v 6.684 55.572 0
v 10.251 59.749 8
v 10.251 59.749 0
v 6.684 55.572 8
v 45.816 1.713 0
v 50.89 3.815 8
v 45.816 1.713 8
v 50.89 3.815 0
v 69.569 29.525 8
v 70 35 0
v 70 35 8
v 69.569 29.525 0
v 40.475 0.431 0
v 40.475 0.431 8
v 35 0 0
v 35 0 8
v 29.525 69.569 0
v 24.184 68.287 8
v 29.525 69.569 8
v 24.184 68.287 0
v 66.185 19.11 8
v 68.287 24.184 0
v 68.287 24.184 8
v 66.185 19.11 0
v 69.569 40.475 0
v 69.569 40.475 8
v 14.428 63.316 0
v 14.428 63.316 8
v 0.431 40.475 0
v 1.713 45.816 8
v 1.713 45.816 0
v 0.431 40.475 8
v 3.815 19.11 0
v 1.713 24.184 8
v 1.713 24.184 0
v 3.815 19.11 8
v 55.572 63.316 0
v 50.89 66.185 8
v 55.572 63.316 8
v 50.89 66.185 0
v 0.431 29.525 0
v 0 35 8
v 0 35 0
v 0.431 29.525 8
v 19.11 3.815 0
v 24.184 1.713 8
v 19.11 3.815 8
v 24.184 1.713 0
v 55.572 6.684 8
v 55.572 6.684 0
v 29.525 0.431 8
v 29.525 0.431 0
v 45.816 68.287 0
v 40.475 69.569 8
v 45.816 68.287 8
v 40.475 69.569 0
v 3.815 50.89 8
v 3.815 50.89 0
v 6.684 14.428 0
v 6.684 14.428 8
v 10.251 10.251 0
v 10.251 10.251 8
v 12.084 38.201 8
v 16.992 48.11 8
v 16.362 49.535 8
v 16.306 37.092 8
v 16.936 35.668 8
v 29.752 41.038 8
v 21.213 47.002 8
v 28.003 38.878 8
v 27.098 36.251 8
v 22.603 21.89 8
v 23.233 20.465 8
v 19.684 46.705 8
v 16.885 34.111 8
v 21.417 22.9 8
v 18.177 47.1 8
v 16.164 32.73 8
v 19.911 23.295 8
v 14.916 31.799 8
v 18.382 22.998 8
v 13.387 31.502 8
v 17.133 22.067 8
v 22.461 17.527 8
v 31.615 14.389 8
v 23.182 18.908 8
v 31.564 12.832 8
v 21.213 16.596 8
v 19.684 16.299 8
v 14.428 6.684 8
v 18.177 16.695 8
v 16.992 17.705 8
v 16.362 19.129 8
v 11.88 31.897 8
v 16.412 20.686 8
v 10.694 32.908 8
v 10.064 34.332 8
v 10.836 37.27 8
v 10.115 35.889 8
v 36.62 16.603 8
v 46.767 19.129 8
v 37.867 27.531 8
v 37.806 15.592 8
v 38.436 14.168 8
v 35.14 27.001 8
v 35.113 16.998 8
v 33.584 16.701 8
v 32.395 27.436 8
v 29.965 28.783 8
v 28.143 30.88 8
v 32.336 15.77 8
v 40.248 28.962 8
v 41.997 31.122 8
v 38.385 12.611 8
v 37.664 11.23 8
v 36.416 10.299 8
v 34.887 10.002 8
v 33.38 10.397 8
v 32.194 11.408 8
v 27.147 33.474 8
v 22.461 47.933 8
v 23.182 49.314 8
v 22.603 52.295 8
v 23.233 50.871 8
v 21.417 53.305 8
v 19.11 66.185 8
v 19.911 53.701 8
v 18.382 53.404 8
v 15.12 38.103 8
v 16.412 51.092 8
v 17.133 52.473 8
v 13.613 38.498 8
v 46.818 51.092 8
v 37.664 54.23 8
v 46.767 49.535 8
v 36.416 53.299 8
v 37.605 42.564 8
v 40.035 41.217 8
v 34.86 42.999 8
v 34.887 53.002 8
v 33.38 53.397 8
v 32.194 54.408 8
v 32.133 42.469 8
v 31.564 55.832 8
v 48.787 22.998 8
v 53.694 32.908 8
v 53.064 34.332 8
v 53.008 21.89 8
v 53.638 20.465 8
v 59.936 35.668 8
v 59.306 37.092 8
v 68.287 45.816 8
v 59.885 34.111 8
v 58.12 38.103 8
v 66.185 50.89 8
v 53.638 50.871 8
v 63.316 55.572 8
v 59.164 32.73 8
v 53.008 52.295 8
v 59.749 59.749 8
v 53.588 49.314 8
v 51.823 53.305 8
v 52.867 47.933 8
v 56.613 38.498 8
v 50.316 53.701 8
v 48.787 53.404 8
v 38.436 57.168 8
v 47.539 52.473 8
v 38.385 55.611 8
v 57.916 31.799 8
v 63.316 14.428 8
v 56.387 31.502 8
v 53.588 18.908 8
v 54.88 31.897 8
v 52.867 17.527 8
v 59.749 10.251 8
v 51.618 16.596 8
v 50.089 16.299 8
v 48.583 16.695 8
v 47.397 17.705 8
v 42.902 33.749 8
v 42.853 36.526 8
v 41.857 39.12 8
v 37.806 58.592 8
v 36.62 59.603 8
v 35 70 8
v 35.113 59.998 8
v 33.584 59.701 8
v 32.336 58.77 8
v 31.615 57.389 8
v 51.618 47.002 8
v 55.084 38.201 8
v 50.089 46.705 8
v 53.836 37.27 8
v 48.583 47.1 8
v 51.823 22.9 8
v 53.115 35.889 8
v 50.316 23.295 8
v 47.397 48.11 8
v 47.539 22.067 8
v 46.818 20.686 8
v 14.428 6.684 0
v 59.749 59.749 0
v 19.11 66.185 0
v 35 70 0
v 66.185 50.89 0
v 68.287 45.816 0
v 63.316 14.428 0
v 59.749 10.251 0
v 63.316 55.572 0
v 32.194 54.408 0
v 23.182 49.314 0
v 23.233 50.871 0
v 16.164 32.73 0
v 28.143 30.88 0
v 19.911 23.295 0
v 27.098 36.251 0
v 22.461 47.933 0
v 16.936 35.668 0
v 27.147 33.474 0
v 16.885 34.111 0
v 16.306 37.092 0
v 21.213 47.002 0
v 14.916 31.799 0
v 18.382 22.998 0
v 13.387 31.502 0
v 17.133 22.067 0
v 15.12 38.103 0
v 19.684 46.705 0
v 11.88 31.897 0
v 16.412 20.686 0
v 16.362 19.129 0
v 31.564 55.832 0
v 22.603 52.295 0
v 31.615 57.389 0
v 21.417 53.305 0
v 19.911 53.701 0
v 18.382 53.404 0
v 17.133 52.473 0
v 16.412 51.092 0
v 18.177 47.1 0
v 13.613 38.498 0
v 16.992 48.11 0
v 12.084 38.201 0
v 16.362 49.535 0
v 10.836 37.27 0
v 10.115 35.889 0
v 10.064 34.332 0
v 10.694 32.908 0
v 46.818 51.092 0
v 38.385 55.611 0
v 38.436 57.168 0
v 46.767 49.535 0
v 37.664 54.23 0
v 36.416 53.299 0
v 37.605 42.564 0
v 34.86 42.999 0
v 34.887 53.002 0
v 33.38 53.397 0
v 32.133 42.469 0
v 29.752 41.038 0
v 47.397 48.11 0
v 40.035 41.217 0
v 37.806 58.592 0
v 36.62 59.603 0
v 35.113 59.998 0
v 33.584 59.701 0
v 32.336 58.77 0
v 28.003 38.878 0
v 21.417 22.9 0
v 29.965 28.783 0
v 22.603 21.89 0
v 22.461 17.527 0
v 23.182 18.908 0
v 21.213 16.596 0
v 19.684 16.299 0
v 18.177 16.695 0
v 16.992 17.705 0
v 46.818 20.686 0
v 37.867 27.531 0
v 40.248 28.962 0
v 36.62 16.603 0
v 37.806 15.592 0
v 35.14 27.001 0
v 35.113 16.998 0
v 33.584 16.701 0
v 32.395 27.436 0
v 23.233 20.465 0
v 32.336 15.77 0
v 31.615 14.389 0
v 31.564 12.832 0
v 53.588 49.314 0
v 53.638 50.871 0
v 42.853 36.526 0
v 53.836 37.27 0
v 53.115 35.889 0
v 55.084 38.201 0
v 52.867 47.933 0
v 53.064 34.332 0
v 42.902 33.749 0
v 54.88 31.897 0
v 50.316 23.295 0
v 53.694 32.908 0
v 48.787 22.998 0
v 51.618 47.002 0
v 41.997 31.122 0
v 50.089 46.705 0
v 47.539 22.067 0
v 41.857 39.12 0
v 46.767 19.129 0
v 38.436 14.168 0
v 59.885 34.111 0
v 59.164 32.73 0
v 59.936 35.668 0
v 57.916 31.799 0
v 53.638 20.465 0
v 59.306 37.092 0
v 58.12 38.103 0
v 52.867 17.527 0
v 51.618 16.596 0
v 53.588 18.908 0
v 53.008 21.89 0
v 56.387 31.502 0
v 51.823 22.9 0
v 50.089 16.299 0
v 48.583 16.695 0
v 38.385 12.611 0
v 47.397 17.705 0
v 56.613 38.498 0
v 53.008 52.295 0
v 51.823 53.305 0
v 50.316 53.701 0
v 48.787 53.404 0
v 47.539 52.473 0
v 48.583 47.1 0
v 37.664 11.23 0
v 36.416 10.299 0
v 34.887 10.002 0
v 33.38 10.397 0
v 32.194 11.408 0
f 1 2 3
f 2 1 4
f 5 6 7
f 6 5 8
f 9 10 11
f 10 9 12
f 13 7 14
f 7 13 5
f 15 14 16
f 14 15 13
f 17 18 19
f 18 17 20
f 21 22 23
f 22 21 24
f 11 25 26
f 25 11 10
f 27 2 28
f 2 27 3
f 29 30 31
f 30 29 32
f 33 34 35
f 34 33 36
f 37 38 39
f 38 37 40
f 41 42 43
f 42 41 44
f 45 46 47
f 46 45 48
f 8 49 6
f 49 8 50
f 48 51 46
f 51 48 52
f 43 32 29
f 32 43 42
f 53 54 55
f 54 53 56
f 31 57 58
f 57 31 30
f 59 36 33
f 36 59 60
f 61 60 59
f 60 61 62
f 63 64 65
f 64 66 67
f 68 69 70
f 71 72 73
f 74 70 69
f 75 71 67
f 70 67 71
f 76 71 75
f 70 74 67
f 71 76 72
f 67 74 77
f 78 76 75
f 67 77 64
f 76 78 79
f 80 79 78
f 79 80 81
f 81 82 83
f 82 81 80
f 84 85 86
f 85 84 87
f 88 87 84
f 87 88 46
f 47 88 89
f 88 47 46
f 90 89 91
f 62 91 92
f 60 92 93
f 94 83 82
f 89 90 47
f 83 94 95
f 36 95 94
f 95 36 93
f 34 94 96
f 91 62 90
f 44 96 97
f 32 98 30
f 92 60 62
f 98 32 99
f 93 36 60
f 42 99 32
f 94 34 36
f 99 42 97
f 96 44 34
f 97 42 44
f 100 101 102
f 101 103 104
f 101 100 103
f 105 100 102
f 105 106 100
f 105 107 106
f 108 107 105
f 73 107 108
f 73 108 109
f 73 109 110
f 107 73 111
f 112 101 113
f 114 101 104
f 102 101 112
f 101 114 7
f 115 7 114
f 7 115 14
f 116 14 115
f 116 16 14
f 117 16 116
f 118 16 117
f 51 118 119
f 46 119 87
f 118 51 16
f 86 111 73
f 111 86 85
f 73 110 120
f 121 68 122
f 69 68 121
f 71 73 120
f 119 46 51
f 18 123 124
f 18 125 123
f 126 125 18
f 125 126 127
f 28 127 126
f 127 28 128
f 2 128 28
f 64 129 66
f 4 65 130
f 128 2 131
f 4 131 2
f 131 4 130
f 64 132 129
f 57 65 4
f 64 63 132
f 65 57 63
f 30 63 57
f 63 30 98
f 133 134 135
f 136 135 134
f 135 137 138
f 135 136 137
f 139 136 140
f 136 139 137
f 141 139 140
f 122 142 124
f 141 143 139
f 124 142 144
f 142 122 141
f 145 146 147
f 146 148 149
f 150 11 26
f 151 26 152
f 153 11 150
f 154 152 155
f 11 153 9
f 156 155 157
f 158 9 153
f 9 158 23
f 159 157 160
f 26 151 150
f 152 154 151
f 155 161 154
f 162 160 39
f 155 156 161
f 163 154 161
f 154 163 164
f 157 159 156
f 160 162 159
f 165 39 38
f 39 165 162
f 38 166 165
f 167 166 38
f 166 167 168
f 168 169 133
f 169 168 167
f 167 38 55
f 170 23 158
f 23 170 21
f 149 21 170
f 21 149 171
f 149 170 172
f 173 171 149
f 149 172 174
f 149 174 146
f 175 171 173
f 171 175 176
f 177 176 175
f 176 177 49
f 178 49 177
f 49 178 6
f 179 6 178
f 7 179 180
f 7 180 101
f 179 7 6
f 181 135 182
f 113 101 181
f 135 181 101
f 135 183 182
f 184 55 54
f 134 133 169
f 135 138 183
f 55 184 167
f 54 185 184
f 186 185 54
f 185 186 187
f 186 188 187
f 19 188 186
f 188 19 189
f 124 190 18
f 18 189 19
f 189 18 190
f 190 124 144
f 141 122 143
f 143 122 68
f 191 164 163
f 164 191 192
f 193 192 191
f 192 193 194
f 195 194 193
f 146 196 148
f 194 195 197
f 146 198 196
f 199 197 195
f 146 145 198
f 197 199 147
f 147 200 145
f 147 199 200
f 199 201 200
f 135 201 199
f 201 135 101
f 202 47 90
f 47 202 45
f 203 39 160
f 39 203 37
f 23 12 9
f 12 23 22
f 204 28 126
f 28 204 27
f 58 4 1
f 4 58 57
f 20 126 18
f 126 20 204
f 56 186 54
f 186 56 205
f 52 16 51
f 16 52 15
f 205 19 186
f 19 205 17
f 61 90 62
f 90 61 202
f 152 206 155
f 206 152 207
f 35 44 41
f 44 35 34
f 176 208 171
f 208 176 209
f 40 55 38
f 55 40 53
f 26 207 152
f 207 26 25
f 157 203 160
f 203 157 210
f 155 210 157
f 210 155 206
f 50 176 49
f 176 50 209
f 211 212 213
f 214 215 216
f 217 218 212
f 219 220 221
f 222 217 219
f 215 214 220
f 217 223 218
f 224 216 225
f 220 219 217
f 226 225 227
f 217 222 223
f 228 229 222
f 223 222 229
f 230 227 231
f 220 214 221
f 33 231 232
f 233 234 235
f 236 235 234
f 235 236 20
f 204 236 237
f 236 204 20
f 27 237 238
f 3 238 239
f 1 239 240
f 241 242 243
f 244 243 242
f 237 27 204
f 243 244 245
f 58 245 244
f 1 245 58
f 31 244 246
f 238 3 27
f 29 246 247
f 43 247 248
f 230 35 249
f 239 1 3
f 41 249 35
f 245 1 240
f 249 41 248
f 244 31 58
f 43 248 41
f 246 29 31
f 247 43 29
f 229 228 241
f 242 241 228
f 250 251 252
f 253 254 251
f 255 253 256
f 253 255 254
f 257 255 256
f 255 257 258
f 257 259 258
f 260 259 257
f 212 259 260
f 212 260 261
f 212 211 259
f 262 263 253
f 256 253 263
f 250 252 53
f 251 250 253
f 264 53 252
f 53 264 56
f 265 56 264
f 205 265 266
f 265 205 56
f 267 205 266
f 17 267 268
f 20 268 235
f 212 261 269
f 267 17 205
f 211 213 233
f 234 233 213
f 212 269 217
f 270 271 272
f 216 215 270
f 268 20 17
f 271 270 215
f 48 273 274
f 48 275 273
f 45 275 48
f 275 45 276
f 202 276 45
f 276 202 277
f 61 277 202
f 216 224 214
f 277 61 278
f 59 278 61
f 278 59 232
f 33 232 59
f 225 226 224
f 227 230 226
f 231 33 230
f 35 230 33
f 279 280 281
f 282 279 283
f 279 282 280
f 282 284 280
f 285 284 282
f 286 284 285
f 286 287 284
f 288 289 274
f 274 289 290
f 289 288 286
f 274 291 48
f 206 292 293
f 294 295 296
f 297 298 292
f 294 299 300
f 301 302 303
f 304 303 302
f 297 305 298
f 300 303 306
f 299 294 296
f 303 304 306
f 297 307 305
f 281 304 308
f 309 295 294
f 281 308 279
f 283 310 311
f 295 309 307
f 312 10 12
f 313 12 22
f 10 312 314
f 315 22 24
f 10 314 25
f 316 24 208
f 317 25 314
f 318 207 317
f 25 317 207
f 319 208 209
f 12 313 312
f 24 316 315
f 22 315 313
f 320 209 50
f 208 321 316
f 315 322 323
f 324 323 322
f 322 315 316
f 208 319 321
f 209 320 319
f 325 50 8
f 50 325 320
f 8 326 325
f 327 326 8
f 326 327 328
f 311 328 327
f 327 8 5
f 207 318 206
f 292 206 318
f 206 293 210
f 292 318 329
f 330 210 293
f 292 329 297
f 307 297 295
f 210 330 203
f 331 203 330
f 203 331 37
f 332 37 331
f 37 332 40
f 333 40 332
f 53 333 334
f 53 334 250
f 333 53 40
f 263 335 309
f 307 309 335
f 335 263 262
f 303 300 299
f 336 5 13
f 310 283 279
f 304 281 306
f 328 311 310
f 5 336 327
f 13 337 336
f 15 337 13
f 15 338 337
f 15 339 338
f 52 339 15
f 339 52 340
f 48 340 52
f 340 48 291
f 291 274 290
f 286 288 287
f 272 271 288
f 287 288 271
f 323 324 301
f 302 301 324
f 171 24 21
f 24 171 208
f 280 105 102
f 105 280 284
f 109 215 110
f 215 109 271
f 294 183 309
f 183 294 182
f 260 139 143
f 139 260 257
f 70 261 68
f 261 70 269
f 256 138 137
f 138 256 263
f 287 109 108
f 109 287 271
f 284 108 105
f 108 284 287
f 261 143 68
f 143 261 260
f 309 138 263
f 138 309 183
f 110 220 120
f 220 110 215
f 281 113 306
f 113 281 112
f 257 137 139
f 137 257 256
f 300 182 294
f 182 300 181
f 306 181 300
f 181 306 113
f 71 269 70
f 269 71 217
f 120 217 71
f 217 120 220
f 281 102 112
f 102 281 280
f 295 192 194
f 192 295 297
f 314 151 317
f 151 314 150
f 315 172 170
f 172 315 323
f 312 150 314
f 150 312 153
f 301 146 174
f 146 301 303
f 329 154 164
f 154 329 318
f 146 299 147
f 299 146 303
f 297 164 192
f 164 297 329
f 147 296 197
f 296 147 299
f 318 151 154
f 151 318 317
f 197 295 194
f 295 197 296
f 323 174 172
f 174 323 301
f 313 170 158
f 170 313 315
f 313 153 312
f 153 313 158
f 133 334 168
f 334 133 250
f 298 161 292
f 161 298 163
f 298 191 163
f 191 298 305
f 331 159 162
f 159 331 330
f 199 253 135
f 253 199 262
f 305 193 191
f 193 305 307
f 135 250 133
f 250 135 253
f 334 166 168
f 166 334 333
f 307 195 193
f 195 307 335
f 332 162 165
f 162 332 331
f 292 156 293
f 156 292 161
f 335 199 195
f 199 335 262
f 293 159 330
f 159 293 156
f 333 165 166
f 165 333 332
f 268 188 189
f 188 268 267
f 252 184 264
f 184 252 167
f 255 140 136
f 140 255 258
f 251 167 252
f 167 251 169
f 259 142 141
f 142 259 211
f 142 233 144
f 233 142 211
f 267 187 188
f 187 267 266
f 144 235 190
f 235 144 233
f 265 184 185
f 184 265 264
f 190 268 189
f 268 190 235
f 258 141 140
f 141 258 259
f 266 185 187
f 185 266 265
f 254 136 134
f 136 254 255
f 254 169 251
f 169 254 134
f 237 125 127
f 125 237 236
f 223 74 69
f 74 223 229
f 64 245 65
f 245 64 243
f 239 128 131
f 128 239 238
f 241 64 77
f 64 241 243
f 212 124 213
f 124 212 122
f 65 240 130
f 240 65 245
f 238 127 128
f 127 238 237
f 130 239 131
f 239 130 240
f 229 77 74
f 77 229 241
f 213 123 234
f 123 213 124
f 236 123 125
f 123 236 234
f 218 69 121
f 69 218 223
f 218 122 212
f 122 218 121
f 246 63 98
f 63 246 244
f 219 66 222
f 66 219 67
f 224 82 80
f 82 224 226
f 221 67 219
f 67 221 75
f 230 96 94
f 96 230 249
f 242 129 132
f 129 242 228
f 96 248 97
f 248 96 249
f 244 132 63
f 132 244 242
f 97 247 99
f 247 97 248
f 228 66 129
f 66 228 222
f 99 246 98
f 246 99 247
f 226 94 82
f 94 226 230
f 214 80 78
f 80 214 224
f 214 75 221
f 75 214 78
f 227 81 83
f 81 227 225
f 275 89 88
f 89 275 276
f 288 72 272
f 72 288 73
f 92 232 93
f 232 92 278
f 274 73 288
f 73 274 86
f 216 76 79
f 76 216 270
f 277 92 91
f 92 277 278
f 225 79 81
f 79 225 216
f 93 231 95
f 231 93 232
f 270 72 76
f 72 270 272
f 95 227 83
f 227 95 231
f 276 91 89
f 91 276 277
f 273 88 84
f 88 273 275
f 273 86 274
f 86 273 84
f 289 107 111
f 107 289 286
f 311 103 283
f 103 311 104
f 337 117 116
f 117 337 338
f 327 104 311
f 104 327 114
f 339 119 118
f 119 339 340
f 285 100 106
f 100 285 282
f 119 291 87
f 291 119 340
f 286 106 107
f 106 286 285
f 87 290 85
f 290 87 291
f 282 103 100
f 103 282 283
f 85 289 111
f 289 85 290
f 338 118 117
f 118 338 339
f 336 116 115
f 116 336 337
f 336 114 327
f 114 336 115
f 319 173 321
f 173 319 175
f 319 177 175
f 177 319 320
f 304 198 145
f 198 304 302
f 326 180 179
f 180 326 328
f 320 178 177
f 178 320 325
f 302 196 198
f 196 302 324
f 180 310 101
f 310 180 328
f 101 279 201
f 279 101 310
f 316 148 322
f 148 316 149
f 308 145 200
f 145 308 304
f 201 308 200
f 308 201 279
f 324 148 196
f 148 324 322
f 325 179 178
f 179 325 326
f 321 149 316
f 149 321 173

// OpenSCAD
$fn = 32;

// ----------------------------------------------------------------------
// Spacer plate: round flange R35, 8 bolts
// ----------------------------------------------------------------------

// --- parameters (mm) ---
bore_r = 8;               // centre bore radius
bolt_r = 3.5;             // bolt hole radius
plate_t = 8;              // plate thickness, Z (extrusion height)
flange_r = 35;            // flange radius
n_bolt = 8;               // bolt hole count
ring_r = 21.5;            // bolt circle radius

profile = [[70, 35], [69.569, 40.475], [68.287, 45.816], [66.185, 50.89], [63.316, 55.572], [59.749, 59.749], [55.572, 63.316], [50.89, 66.185], [45.816, 68.287], [40.475, 69.569], [35, 70], [29.525, 69.569], [24.184, 68.287], [19.11, 66.185], [14.428, 63.316], [10.251, 59.749], [6.684, 55.572], [3.815, 50.89], [1.713, 45.816], [0.431, 40.475], [0, 35], [0.431, 29.525], [1.713, 24.184], [3.815, 19.11], [6.684, 14.428], [10.251, 10.251], [14.428, 6.684], [19.11, 3.815], [24.184, 1.713], [29.525, 0.431], [35, 0], [40.475, 0.431], [45.816, 1.713], [50.89, 3.815], [55.572, 6.684], [59.749, 10.251], [63.316, 14.428], [66.185, 19.11], [68.287, 24.184], [69.569, 29.525]];  // primary outline, 40 points, counter clockwise
void_1 = [[42.853, 36.526], [41.857, 39.12], [40.035, 41.217], [37.605, 42.564], [34.86, 42.999], [32.133, 42.469], [29.752, 41.038], [28.003, 38.878], [27.098, 36.251], [27.147, 33.474], [28.143, 30.88], [29.965, 28.783], [32.395, 27.436], [35.14, 27.001], [37.867, 27.531], [40.248, 28.962], [41.997, 31.122], [42.902, 33.749]];  // centre bore, 18 points
void_2 = [[59.936, 35.668], [59.306, 37.092], [58.12, 38.103], [56.613, 38.498], [55.084, 38.201], [53.836, 37.27], [53.115, 35.889], [53.064, 34.332], [53.694, 32.908], [54.88, 31.897], [56.387, 31.502], [57.916, 31.799], [59.164, 32.73], [59.885, 34.111]];  // bolt hole 1, 14 points
void_3 = [[53.638, 50.871], [53.008, 52.295], [51.823, 53.305], [50.316, 53.701], [48.787, 53.404], [47.539, 52.473], [46.818, 51.092], [46.767, 49.535], [47.397, 48.11], [48.583, 47.1], [50.089, 46.705], [51.618, 47.002], [52.867, 47.933], [53.588, 49.314]];  // bolt hole 2, 14 points
void_4 = [[38.436, 57.168], [37.806, 58.592], [36.62, 59.603], [35.113, 59.998], [33.584, 59.701], [32.336, 58.77], [31.615, 57.389], [31.564, 55.832], [32.194, 54.408], [33.38, 53.397], [34.887, 53.002], [36.416, 53.299], [37.664, 54.23], [38.385, 55.611]];  // bolt hole 3, 14 points
void_5 = [[23.233, 50.871], [22.603, 52.295], [21.417, 53.305], [19.911, 53.701], [18.382, 53.404], [17.133, 52.473], [16.412, 51.092], [16.362, 49.535], [16.992, 48.11], [18.177, 47.1], [19.684, 46.705], [21.213, 47.002], [22.461, 47.933], [23.182, 49.314]];  // bolt hole 4, 14 points
void_6 = [[16.936, 35.668], [16.306, 37.092], [15.12, 38.103], [13.613, 38.498], [12.084, 38.201], [10.836, 37.27], [10.115, 35.889], [10.064, 34.332], [10.694, 32.908], [11.88, 31.897], [13.387, 31.502], [14.916, 31.799], [16.164, 32.73], [16.885, 34.111]];  // bolt hole 5, 14 points
void_7 = [[23.233, 20.465], [22.603, 21.89], [21.417, 22.9], [19.911, 23.295], [18.382, 22.998], [17.133, 22.067], [16.412, 20.686], [16.362, 19.129], [16.992, 17.705], [18.177, 16.695], [19.684, 16.299], [21.213, 16.596], [22.461, 17.527], [23.182, 18.908]];  // bolt hole 6, 14 points
void_8 = [[38.436, 14.168], [37.806, 15.592], [36.62, 16.603], [35.113, 16.998], [33.584, 16.701], [32.336, 15.77], [31.615, 14.389], [31.564, 12.832], [32.194, 11.408], [33.38, 10.397], [34.887, 10.002], [36.416, 10.299], [37.664, 11.23], [38.385, 12.611]];  // bolt hole 7, 14 points
void_9 = [[53.638, 20.465], [53.008, 21.89], [51.823, 22.9], [50.316, 23.295], [48.787, 22.998], [47.539, 22.067], [46.818, 20.686], [46.767, 19.129], [47.397, 17.705], [48.583, 16.695], [50.089, 16.299], [51.618, 16.596], [52.867, 17.527], [53.588, 18.908]];  // bolt hole 8, 14 points

// --- the one profile operation ---
difference() {
  linear_extrude(height = plate_t) polygon(points = profile);
  translate([0, 0, -1])
    linear_extrude(height = plate_t + 2) polygon(points = void_1);
  translate([0, 0, -1])
    linear_extrude(height = plate_t + 2) polygon(points = void_2);
  translate([0, 0, -1])
    linear_extrude(height = plate_t + 2) polygon(points = void_3);
  translate([0, 0, -1])
    linear_extrude(height = plate_t + 2) polygon(points = void_4);
  translate([0, 0, -1])
    linear_extrude(height = plate_t + 2) polygon(points = void_5);
  translate([0, 0, -1])
    linear_extrude(height = plate_t + 2) polygon(points = void_6);
  translate([0, 0, -1])
    linear_extrude(height = plate_t + 2) polygon(points = void_7);
  translate([0, 0, -1])
    linear_extrude(height = plate_t + 2) polygon(points = void_8);
  translate([0, 0, -1])
    linear_extrude(height = plate_t + 2) polygon(points = void_9);
}
